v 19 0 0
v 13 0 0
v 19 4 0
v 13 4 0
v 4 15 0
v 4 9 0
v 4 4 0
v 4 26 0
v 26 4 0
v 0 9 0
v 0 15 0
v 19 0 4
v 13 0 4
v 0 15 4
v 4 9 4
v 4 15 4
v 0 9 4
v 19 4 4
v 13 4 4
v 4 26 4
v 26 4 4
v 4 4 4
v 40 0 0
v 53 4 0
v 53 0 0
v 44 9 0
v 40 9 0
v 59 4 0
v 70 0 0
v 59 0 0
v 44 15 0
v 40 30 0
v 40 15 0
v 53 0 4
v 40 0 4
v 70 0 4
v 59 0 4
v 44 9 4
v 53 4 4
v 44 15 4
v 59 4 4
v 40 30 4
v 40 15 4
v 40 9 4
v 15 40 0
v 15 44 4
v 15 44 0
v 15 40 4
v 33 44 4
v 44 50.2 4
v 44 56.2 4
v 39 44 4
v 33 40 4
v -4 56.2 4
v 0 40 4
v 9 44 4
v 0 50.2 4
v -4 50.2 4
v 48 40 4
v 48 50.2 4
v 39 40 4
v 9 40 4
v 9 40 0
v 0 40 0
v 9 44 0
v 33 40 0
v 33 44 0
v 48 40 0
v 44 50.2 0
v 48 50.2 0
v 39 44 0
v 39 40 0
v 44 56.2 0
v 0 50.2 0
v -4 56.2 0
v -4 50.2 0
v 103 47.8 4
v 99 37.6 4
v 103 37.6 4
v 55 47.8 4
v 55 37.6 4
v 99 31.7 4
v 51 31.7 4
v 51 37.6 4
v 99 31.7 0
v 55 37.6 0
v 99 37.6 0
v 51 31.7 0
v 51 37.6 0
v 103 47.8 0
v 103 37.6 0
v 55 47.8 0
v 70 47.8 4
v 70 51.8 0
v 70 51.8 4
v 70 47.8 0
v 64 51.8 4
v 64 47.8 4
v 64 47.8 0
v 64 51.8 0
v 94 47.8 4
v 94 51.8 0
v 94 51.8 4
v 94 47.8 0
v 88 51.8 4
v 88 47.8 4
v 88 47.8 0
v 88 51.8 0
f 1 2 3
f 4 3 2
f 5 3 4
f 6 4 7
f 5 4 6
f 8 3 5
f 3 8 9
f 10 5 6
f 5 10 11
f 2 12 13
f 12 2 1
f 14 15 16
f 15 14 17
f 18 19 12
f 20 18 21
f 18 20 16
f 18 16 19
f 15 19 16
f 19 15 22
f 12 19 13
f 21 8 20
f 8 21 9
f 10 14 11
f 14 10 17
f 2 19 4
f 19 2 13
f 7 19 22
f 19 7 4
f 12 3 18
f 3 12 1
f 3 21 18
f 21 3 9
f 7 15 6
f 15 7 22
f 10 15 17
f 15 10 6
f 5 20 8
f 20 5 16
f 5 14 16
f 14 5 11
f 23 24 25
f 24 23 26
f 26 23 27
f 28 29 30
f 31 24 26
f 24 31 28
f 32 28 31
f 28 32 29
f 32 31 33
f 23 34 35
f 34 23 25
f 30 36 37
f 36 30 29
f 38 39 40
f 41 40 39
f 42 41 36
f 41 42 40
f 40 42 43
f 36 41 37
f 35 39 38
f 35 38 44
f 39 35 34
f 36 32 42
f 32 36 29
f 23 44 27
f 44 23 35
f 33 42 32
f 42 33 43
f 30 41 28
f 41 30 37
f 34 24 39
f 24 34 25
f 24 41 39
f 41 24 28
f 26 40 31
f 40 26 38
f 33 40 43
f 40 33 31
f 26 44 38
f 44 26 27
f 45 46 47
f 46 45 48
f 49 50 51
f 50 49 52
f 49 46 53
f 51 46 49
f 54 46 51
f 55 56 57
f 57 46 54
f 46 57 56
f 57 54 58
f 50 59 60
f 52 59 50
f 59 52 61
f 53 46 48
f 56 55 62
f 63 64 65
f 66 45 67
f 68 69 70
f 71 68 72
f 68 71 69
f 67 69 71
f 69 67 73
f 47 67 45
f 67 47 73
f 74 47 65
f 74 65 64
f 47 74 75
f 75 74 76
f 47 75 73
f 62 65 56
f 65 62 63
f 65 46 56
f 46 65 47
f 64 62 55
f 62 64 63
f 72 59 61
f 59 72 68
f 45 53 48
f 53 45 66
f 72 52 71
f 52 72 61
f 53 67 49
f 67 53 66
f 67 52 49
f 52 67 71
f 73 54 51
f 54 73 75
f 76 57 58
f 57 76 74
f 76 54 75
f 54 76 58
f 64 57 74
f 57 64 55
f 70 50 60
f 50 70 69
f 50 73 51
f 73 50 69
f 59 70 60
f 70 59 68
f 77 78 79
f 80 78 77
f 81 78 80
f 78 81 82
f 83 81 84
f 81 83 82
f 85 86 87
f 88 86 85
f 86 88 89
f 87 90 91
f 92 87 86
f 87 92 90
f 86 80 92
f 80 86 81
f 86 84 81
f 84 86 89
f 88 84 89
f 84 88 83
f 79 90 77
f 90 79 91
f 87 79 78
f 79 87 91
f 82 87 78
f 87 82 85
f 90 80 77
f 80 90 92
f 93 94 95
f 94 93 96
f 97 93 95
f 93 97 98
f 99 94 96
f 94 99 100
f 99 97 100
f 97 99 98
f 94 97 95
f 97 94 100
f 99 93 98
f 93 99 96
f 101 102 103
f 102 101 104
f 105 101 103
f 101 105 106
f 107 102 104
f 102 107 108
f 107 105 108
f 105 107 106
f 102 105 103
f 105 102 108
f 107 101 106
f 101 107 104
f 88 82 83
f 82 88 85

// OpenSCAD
// file: plate_ny.scad
include <inc/constants.scad>


module plate(width=2, height=2, holes=true)
{
//total width (sans holders)
twidth = width*dhx+width*2*hr;
theight = height*dhy+height*2*hr;

difference()
{
cube([twidth, theight,4]);


  union()
  {
  //translate fastener height
  //for more even-ness
  translate([-fh/2,fh/2,0])
  translate([dhx/2+hr,hr+dhy/2,-1])
  for(i=[0:width-1])
  {
    for(j=[0:height-1])
    {
		if(holes)
      {
      translate([i*hr*2+dhx*i,j*hr*2+j*dhy,0])
      cylinder(r=hr+pgive, h=10);
      }
      
    }
  }

  //fastener holes, bottom
  fasteners();

  //fastener holes, side
  translate([twidth,0,0])
  rotate([0,0,90])
  fasteners(dist=dhy, w=false);
  }
}

module fasteners(dist=dhx, w=true)
{

if(w)
{
for(i=[0:width-1])
{
translate([dist/2+hr-fw/2+i*dist+i*hr*2,0,0])
cube([fw,fh,4]);
}
}
else
{
for(i=[0:height-1])
{
translate([dist/2+hr-fw/2+i*dist+i*hr*2,0,0])
cube([fw,fh,4]);
}
}

}

//top fasteners
translate([0,theight,0])
fasteners();

//side fasteners
rotate([0,0,90])
fasteners(dist=dhy, w=false);



}

plate(4,4);
// file: inc/constants.scad
pi=3.1415;
$fn=80;
//hole radius
hr = 6;

//distance between holes
dh = 12;

//x distance between holes
dhx = 12;

//y distance between holes
dhy = 14.4;
//dhy=20;

//give between two gears
giveg = .5;

//shaft give
sgive = .6;

//plug give
//pgive = .15;

pgive = .12;


//fastener give (holes)
fgive = .13;

pitch=.25;

//gear give (hole)
ggive = .45;

//spacer give
spgive = .3;


////fastener sizes
//notch width
notchw = 0;

//notch height
notchh = 0;

//fastener height
fh = 4;

//fastener width (sans notch)
fw = hr;


//gear hole radius
ghr = 1.4;

//arrow length
al = 8;


//give for the nut
nut_give = .8;
// main file
include <inc/constants.scad>
use <plate_ny.scad>

twidth=2*(dhx+2*hr)+dhx;

/*
plate(4,2);

translate([0,0,twidth-dhx])
rotate([0,-90,0])
mirror([1,0,0])
plate(2,2);
*/


//translate([-4,60,0])
//rotate([90,0,0])
module female()
{
difference()
{
translate([0,0,0])
linear_extrude(height=4)
polygon(points=[[0,0], [twidth/2,0], [0, twidth/2]]);

translate([dhx/2+hr+4-fw/2,0,-.1])
cube([fw,fh,5]);

translate([0,dhx/2+fw/2,-.1])
cube([fh,fw,5]);
}
}

//female();


module male()
{
translate([0,0,0])
difference()
{

translate([0,0,0])
linear_extrude(height=4)
polygon(points=[[0,0], [twidth/2,0], [0, twidth/2]]);

cube([dhx+fh-fw/2,fh,4]);
translate([dhx+fh-fw/2+fw,0,0])
cube([dhx,fh,4]);



cube([fh,dhx+fh-fw/2-4,4]);
translate([0,dhx+fh-fw/2-4+fw,0])
cube([fh,dhx+fh-fw/2+dhx,4]);


}
}

module full_male()
{
difference()
{
plate(2,2, holes=false);
translate([-5,16.7-40,-.1])
cube([60,60,5]);
}
}


module full_female()
{
difference()
{
plate(2,2, holes=false);
translate([-5,16.2,-.1])
cube([60,60,5]);
}
}


//translate([-4,4+3,0])
//rotate([90,0,0])
male();

translate([40,0,0])
female();

translate([0,40,0])
full_female();


translate([55,-5,0])
full_male();
